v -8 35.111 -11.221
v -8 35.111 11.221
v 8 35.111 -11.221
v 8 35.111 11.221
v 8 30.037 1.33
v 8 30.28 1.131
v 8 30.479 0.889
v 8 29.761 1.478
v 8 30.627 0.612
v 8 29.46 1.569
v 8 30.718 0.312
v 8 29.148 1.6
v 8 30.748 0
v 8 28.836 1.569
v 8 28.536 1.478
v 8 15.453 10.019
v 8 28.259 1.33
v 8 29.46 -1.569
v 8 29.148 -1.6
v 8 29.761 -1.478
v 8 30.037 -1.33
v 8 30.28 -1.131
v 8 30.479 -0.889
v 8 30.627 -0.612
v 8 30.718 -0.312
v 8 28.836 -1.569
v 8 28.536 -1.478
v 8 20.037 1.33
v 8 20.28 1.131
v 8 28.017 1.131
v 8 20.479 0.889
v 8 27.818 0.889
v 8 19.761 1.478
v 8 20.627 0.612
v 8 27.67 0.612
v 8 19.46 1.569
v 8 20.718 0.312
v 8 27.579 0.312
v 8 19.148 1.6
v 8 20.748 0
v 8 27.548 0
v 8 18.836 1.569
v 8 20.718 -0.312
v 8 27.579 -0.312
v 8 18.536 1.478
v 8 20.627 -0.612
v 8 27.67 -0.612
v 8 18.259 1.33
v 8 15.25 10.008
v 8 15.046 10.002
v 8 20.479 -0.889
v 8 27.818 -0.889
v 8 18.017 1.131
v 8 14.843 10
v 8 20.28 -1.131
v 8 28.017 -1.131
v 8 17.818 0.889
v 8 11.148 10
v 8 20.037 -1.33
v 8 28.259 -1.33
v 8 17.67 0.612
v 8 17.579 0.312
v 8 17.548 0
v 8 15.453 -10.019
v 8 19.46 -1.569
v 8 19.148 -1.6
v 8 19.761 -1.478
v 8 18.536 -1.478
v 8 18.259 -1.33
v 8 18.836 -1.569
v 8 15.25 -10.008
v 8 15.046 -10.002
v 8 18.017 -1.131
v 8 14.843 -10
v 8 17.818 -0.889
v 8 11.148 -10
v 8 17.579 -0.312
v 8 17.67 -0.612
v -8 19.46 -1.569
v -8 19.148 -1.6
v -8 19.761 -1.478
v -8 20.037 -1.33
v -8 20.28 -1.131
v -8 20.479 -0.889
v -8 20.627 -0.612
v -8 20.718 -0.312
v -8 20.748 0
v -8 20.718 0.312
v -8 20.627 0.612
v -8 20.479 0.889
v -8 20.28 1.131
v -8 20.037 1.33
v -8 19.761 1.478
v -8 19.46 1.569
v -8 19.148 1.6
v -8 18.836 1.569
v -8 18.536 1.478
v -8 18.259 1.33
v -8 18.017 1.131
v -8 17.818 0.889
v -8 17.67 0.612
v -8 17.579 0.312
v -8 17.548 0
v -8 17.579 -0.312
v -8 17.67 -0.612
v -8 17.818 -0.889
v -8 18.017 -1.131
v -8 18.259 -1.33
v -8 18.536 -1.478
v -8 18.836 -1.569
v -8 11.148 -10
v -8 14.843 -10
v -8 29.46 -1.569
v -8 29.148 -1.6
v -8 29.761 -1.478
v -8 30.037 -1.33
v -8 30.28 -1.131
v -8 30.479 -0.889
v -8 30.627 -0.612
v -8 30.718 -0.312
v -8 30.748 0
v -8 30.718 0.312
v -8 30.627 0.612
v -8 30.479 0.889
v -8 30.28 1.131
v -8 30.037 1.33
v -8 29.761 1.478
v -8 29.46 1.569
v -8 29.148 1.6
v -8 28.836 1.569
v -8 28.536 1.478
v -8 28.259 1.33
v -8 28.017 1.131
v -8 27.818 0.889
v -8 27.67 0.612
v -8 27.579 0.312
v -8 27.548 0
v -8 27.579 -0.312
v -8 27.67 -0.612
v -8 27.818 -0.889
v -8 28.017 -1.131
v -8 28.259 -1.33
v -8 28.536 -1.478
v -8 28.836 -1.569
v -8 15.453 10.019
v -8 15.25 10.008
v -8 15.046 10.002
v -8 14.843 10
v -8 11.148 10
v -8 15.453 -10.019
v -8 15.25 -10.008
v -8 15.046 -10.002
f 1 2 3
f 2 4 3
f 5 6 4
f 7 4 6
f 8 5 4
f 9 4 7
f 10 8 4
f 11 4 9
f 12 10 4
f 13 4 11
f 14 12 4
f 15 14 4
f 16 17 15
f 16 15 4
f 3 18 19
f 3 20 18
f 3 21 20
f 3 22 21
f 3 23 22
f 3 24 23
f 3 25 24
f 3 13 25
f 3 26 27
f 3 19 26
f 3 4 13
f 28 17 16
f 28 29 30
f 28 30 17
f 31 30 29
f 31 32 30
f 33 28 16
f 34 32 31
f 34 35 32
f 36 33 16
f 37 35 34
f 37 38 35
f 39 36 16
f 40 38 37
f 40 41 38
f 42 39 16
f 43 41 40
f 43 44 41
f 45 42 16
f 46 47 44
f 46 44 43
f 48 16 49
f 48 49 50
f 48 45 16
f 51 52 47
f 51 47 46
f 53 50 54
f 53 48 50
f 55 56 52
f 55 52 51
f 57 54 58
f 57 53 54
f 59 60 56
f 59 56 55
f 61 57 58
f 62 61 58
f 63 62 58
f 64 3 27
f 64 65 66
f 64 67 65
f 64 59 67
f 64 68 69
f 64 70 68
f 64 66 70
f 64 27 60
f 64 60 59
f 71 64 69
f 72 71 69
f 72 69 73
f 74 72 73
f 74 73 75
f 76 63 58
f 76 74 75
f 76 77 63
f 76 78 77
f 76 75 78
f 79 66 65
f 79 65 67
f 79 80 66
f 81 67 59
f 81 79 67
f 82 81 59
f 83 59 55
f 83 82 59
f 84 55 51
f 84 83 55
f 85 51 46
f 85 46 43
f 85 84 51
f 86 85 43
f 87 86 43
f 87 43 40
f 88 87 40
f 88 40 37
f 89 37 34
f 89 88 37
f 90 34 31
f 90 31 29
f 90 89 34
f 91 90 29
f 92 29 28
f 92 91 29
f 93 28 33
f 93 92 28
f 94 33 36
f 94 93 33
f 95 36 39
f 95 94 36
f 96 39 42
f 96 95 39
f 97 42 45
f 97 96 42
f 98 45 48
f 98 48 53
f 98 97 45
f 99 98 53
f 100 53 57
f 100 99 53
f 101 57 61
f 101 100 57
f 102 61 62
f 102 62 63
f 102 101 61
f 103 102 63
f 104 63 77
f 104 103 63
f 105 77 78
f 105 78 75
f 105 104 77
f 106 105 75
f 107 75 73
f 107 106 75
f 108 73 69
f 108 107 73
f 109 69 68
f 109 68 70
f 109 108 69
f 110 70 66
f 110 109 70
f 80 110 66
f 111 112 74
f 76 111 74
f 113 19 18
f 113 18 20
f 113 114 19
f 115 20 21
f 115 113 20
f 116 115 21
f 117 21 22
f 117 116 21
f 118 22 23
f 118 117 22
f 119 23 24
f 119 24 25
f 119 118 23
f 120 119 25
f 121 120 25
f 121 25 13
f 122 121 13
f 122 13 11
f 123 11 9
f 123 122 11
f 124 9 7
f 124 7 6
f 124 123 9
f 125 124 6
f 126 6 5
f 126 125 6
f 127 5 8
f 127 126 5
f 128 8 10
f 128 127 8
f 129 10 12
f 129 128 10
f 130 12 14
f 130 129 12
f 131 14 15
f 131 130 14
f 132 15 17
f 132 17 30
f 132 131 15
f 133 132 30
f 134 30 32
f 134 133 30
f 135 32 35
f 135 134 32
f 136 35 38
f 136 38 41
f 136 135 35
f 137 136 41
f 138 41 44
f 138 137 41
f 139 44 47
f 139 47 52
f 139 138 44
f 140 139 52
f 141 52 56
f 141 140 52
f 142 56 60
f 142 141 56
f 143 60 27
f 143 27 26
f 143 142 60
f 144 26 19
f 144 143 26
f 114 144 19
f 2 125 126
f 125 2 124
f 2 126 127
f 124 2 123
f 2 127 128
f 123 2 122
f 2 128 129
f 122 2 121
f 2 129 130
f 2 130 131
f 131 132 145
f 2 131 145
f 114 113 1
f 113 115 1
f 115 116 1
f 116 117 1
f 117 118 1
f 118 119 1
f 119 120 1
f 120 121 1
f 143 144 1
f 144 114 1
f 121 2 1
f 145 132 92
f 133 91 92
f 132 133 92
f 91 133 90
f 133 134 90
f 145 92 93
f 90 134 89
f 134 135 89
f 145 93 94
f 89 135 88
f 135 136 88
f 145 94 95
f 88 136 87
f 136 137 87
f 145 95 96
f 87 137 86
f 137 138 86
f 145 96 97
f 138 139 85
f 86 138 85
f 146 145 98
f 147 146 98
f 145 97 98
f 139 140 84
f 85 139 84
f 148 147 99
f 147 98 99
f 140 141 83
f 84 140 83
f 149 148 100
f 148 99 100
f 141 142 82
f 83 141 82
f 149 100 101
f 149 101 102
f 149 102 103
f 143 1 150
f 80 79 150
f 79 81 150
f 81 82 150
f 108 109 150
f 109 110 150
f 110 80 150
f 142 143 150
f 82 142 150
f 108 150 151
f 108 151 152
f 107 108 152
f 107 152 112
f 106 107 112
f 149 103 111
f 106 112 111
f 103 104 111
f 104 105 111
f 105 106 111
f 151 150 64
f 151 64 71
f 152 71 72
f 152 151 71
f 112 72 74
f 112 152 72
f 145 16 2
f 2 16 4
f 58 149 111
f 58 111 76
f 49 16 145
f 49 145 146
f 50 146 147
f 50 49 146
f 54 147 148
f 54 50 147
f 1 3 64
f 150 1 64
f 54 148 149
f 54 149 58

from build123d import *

# Parameters (mm, degrees)
EXTRUDE_1_REACH          = 32.84
EXTRUDE_1_END_RADIUS     = 17
SKETCH_4_W               = 16
SKETCH_4_H               = 20
SKETCH_7_R               = 1.6
EXTRUDE_2_DEPTH          = 8
FILLET_1_R               = 2
CUT_EXTRUDE_1_DEPTH      = 10
CUT_EXTRUDE_1_DEPTH_BACK = 28
SKETCH_9_W               = 16
SKETCH_9_H               = 20
EXTRUDE_3_DEPTH          = 4
FILLET_2_R               = 10


with BuildPart() as part:
    # 草图1 → 旋转1 (revolve)
    with BuildSketch(Plane.XY):
        with BuildLine():
            Line((0, 8.148347953), (0, 15.148347953))
            ThreePointArc((0, 15.148347953), (-9.649034823, 12.144637711), (-15.888316149, 4.194951128))
            ThreePointArc((-15.888316149, 4.194951128), (-15.414532258, 2.711018861), (-13.862245394, 2.841140494))
            ThreePointArc((-13.862245394, 2.841140494), (-8.835262424, 6.313648333), (-3, 8.124333536))
            Line((-3, 8.124333536), (-3, -5.851652047))
            Line((-3, -5.851652047), (0, -5.851652047))
            Line((0, -5.851652047), (0, 8.148347953))
        make_face()
    revolve(axis=Axis((0, 30.990444744, 0), (0, -1, 0)))

    # 凸台-拉伸1: up to this sphere (the profile starts outside it)
    extrude_1_end = Location((0, -1.851652047, 0)) * Sphere(EXTRUDE_1_END_RADIUS, mode=Mode.PRIVATE)
    # 草图4 → 凸台-拉伸1 (add, up to the surface)
    with BuildSketch(Plane(origin=(0, 15.148347953, 0), x_dir=(-1, 0, 0), z_dir=(0, -1, 0)), mode=Mode.PRIVATE) as extrude_1_sk1:
        Rectangle(SKETCH_4_W, SKETCH_4_H)
    extrude_1_tool1 = extrude(extrude_1_sk1.sketch, amount=EXTRUDE_1_REACH, mode=Mode.PRIVATE) - extrude_1_end
    add(extrude_1_tool1.solids().sort_by_distance((0, 15.148348, 0))[0])

    # 草图7 → 凸台-拉伸2 (add, symmetric)
    with BuildSketch(Plane(origin=(0, 0, 0), x_dir=(0, 0, -1), z_dir=(1, 0, 0))):
        Polygon((-10, 15.148347953), (-11.220970791, 35.111043921), (11.220970791, 35.111043921), (10, 15.148347953), align=None)
        with Locations((0, 29.148347953)):
            Circle(SKETCH_7_R, mode=Mode.SUBTRACT)
        with Locations((0, 19.148347953)):
            Circle(SKETCH_7_R, mode=Mode.SUBTRACT)
    extrude(amount=EXTRUDE_2_DEPTH, both=True)

    # 圆角1
    fillet_1_edges = [part.edges().sort_by_distance(p)[0] for p in [
        (3, 8.124333536, 0),
    ]]
    fillet(fillet_1_edges, radius=FILLET_1_R)

    # 草图8 → 切除-拉伸1 (cut, two sides: drawn at the far end of the back side and taken through both)
    with BuildSketch(Plane(origin=(8, 0, 0), x_dir=(0, 0, -1), z_dir=(1, 0, 0)).offset(-CUT_EXTRUDE_1_DEPTH_BACK)):
        Polygon((-10, 15.148347953), (10, 15.148347953), (22.074384404, 15.148347953), (22.074384404, -11.334225307), (-23.122772671, -11.334225307), (-23.122772671, 15.148347953), align=None)
    extrude(amount=CUT_EXTRUDE_1_DEPTH + CUT_EXTRUDE_1_DEPTH_BACK, mode=Mode.SUBTRACT)

    # 草图9 → 凸台-拉伸3 (add)
    with BuildSketch(Plane.XZ.offset(-15.148347953)):
        Rectangle(SKETCH_9_W, SKETCH_9_H)
    extrude(amount=EXTRUDE_3_DEPTH)

    # 圆角2
    # the kernel refuses this fillet: 10 mm, written as the material it adds along each edge
    with BuildSketch(Plane(origin=(8, 15.148347953, 10), x_dir=(0, 0.9981347984218685, 0.061048539534831796), z_dir=(-1, 0, 0)), Plane(origin=(-8, 15.148347953, -10), x_dir=(0, 0.9981347984218659, -0.06104853953487234), z_dir=(1, 0, 0))) as fillet_2_piece_1:
        with BuildLine():
            CenterArc((FILLET_2_R * 0.0305527632986, -FILLET_2_R), FILLET_2_R, 90, 3.5)
            Line((-FILLET_2_R * 0.0304957762363, -FILLET_2_R * 0.00186520157813), (0, 0))
            Line((0, 0), (FILLET_2_R * 0.0305527632986, 0))
        make_face()
    extrude(amount=16)


solid = part.part
